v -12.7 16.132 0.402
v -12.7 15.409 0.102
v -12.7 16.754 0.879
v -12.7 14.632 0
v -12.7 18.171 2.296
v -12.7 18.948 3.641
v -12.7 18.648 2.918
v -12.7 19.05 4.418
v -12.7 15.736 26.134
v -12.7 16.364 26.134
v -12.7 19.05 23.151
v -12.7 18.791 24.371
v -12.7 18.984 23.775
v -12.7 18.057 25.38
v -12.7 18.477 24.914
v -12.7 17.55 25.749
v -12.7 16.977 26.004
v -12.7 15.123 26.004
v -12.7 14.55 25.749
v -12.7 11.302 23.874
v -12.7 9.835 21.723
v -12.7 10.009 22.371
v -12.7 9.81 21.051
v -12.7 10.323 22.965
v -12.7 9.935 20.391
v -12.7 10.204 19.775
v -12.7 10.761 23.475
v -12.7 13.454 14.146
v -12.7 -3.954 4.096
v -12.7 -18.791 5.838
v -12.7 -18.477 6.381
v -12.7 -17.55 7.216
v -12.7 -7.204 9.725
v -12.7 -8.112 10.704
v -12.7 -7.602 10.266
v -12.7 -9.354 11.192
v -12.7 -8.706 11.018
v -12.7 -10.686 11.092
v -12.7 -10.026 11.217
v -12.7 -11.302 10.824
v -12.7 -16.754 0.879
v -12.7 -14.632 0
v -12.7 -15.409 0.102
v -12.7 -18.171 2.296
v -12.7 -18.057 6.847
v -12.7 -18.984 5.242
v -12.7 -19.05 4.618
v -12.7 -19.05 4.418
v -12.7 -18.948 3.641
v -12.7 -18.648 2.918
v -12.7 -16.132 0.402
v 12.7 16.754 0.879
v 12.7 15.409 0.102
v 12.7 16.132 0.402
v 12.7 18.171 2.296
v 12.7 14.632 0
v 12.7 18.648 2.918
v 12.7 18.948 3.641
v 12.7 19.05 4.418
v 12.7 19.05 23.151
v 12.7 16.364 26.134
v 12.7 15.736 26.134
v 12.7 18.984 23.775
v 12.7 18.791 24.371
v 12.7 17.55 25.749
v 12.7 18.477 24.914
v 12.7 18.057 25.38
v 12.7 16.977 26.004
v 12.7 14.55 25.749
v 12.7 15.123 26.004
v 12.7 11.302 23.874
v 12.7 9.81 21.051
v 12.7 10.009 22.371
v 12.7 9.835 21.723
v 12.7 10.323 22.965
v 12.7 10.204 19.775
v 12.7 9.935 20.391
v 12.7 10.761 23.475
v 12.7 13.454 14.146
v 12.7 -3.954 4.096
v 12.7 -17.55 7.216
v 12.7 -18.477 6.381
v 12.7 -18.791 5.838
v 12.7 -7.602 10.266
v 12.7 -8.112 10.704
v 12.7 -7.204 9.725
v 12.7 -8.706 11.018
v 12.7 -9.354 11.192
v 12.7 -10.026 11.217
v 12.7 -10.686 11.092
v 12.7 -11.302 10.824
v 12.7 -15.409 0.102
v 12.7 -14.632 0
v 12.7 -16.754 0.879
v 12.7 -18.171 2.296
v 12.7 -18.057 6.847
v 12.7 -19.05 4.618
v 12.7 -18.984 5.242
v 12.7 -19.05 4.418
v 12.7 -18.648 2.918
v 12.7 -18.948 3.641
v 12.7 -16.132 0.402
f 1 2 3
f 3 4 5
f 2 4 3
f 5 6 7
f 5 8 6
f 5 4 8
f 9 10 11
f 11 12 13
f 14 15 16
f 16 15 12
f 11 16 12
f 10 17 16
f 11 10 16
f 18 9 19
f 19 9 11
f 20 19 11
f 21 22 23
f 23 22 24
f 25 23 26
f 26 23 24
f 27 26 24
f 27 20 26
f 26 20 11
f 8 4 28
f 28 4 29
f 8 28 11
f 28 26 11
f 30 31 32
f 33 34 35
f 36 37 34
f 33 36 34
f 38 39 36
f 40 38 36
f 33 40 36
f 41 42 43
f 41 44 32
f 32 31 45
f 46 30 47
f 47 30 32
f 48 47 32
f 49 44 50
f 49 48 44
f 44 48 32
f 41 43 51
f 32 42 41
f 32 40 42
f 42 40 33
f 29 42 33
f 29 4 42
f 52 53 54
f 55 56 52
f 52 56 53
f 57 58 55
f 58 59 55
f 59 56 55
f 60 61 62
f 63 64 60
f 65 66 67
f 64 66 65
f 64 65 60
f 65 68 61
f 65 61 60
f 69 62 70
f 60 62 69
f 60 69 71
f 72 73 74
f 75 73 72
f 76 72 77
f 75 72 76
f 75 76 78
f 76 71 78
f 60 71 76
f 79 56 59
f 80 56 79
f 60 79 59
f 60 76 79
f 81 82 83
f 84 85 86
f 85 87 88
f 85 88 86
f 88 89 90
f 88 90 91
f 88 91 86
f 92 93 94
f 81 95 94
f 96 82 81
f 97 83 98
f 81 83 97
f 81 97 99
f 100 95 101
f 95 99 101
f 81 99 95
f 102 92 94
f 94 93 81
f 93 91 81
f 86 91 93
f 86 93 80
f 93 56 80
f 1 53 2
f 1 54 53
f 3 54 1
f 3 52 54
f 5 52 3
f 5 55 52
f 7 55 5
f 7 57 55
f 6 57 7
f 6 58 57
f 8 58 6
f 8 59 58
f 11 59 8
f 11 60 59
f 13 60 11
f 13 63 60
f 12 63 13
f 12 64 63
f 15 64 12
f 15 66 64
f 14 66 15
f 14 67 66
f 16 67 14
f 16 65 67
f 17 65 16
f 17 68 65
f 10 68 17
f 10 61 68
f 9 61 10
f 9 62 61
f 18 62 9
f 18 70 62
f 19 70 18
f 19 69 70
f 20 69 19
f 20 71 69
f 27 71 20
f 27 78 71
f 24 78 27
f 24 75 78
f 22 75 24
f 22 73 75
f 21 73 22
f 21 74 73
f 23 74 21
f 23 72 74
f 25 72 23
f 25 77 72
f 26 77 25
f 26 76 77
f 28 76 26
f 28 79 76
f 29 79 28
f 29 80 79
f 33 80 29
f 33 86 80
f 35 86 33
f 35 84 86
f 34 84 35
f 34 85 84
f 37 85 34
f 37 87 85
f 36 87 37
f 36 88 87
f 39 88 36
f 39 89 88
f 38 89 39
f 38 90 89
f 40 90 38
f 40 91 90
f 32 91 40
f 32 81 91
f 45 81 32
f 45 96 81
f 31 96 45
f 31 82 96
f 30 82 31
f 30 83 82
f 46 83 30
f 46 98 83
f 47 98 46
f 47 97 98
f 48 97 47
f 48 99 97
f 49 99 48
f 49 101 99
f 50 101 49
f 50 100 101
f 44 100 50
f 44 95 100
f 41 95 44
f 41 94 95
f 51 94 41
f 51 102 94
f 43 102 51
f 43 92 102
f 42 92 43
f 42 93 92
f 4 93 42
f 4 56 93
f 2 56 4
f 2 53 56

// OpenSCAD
// file: ../lib/TOGUnitTable-v1.scad
// TOGUnitTable-v1.1.0 - Library for handling 'complex amounts' in the form of [multiplier, unit name], e.g. [1.5, "inch"]
//
// 2023-07-01: the following 'annotation' is something I just made up,
// but is intended as a way for future packaging tools to know that it's 'safe'
// (because everything has been somewhat namespaced) to turn a `use <x>`
// into an `include <x>`, making it inlinable:
// safe-to-include: true
// 
// Versions:
// v1.0.0:
// - Created it.
// v1.1.0:
// - Add optional 'dbgctxstr' parameter to unit decoding functions, for better error messages
// 
// Naming convention:
// Doing 'OO without classes', here.
// Fully qualified name = class or package name + "__" + member name
// Class or package name may itself be namespaced, and class names may double as package names.
// Here, tog_unittable names both a class and a package.

// Demo unit table uses 'micrometer' as the base unit
// in order to keep multipliers as integers as much as possible.
tog_unittable__demo_unit_table = [
	["um",    [    1   ,   "um"], "micrometer" ],
	["mm",    [ 1000   ,   "um"], "millimeter" ],
	["inch",  [25400   ,   "um"], "inch"       ],
	["u",     [    1/16, "inch"], "model unit" ], // As used by TGx9 et al
	["atom",  [    8   ,    "u"], "model atom" ],
	["chunk", [    3   , "atom"], "model chunk"],
];

use <./DbgCtxStrLib1.scad>

function tog_unittable__list__filter(list, predicate) = [
	for( item=list ) if( predicate(item) ) item
];
function tog_unittable__list__first(list, on_error) =
	len(list) > 0 ? list[0] : on_error();

function tog_unittable__unit_value_ca(unit_table, unit_name, dbgctxstr=undef) =
	tog_unittable__list__first(
		tog_unittable__list__filter(unit_table, function (entry) entry[0] == unit_name),
		function () assert(false,
			str("Did not find entry for unit '", unit_name, "' in unit table", dbgctxstr_errmsg_suffix(dbgctxstr))
		)
	)[1];

function tog_unittable__ca__is_valid( ca ) =
	is_list(ca) && len(ca) == 2;

// Break down 'amount' until it is in a base unit (one which is defined in terms of itself)
function tog_unittable__simplify_ca(unit_table, amount, dbgctxstr=undef) =
	assert( tog_unittable__ca__is_valid(amount), str(amount, " is not a valid Complex Amount (should be [numeric_value, \"unit_name\"])", dbgctxstr=dbgctxstr) )
	let( unit_value_ca = tog_unittable__unit_value_ca(unit_table, amount[1], dbgctxstr=dbgctxstr) )
	unit_value_ca[1] == amount[1] ? amount :
		tog_unittable__simplify_ca(unit_table, [amount[0] * unit_value_ca[0], unit_value_ca[1]]);

function tog_unittable__divide_ca(unit_table, numerator, denominator, dbgctxstr=undef) =
	let(
		numerator_base_ca   = tog_unittable__simplify_ca(unit_table, numerator, dbgctxstr=dbgctxstr),
		denominator_base_ca = tog_unittable__simplify_ca(unit_table, denominator, dbgctxstr=dbgctxstr)
	)
	assert(numerator_base_ca[1] == denominator_base_ca[1], str("Different base units found for ", numerator[1], " and ", denominator[1]))
	numerator_base_ca[0] / denominator_base_ca[0];	

assert(tog_unittable__divide_ca(tog_unittable__demo_unit_table, [1,   "mm"], [  1, "mm"]) ==     1   );
assert(tog_unittable__divide_ca(tog_unittable__demo_unit_table, [1,   "mm"], [  1, "um"]) ==  1000   );
assert(tog_unittable__divide_ca(tog_unittable__demo_unit_table, [1, "inch"], [  1, "um"]) == 25400   );
assert(tog_unittable__divide_ca(tog_unittable__demo_unit_table, [1, "inch"], [  1, "mm"]) ==    25.4 );
assert(tog_unittable__divide_ca(tog_unittable__demo_unit_table, [1, "inch"], [254, "um"]) ==   100   );
assert(tog_unittable__divide_ca(tog_unittable__demo_unit_table, [1,    "u"], [  1, "um"]) ==  1587.5 );
// file: ../lib/TOGStringLib1.scad
// TOGStringLib1.7
// 
// Functions for parsing quantities
// and other misc. string handling.
// 
// v1.5
// - togstr1_parse_quantity will treat unit-only strings as meaning 1/1 of that unit.
//   e.g. togstr1_parse_quantity("foot") = [[[1,1], "foot", 4]]
// v1.6:
// - togstr1_parse_quantity allows unit name to be omitted when quantity is zero and $togunits1_default_unit is defined
// v1.7:
// - Add optional 'dbgctxstr' parameter to unit decoding functions, for better error messages
// 
// Globals: $togunits1_default_unit - affects what 'unit' is returned
// when interpreting numbers or strings that lack the unit.


function togstr1__todo(message) = assert(false, str("TODO: ", message));

module togstr1__assert_eq(a, b) {
	if( a != b ) {
		assert( a == b, str(a, " != ", b) );
	}
}



function togstr1_slice(source, i0, i1) =
	i0 == i1 ? "" :
	str(source[i0], togstr1_slice(source, i0+1, i1));

function togstr1_tokenize(source, sep, maxcount=9999, i=0, tokenstart=0) =
	len(source) == i ? (
		(tokenstart < i) ? [togstr1_slice(source, tokenstart, i)] : []
	) :
	source[i] == sep ? (
		(tokenstart < i) ? concat([togstr1_slice(source, tokenstart, i)], togstr1_tokenize(source, sep, maxcount-1, i+1, i+1)) :
		togstr1_tokenize(source, sep, maxcount, i+1, i+1)
	) :
	maxcount <= 1 ? [togstr1_slice(source, tokenstart, len(source))] :
	togstr1_tokenize(source, sep, maxcount, i+1, tokenstart);

togstr1__assert_eq( ["foo","bar","baz"], togstr1_tokenize("foo-bar-baz", "-") );
// Duplicate delimiters are ignored
togstr1__assert_eq( ["foo","bar","baz"], togstr1_tokenize("foo--bar--baz", "-") );
// Trailing delimiters are ignored
togstr1__assert_eq( ["foo","bar","baz"], togstr1_tokenize("foo--bar--baz--", "-") );
// Leading delimiters are ignored
togstr1__assert_eq( ["foo","bar","baz"], togstr1_tokenize("--foo--bar--baz", "-") );
// Can limit number of tokens returned
togstr1__assert_eq( ["foo","bar-baz"], togstr1_tokenize("foo-bar-baz", "-", 2) );
togstr1__assert_eq( ["foo","bar-baz"], togstr1_tokenize("--foo--bar-baz", "-", 2) );
togstr1__assert_eq( ["foo","bar--baz"], togstr1_tokenize("--foo--bar--baz", "-", 2) );
togstr1__assert_eq( ["foo"], togstr1_tokenize("--foo--", "-", 2) );




/** \d+ -> [num, end_index] */
function togstr1_parse_decimal_nat(str, index=0, current=0, dbgctxstr=undef) =
	len(str) == index ? [current, index] :
	let( dig = ord(str[index]) - ord("0") )
	(dig >= 0 && dig <= 9) ? togstr1_parse_decimal_nat(str, index+1, current*10 + dig, dbgctxstr=dbgctxstr) :
	[current, index];

togstr1__assert_eq( [123,3], togstr1_parse_decimal_nat("123") );
togstr1__assert_eq( [123,3], togstr1_parse_decimal_nat("123.45") );

/** [+-]*\d+ ->  [[num, den], end_index] */
function togstr1_parse_decimal_number(str, index=0, dbgctxstr=undef) =
	str[index] == "+" ? togstr1_parse_decimal_number(str, index+1) :
	str[index] == "-" ? let(r=togstr1_parse_decimal_number(str, index+1)) [[-r[0][0], r[0][1]], r[1]] :
	let(r = togstr1_parse_decimal_nat(str, index, dbgctxstr=dbgctxstr))
	str[r[1]] != "." ? [[r[0], 1], r[1]] :
	let(fracr = togstr1_parse_decimal_nat(str, r[1]+1))
	let(mult = pow(10, fracr[1]-(r[1]+1)))
	[[r[0]*mult + fracr[0], mult], fracr[1]];

togstr1__assert_eq( [[   36,   1], 2], togstr1_parse_decimal_number( "36"   ) );
togstr1__assert_eq( [[ 3524, 100], 5], togstr1_parse_decimal_number( "35.24") );
togstr1__assert_eq( [[-3524, 100], 6], togstr1_parse_decimal_number("-35.24") );
togstr1__assert_eq( [[    0,   1], 0], togstr1_parse_decimal_number( "NotANumber") );

function togstr1__gcd(a, b) = b == 0 ? abs(a) : togstr1__gcd(b, a % b);

togstr1__assert_eq(10, togstr1__gcd(10, 20));
togstr1__assert_eq( 5, togstr1__gcd(10, 15));
togstr1__assert_eq( 2, togstr1__gcd(10, 14));


function togstr1__normalize_rat(rat) =
	let(gcd = togstr1__gcd(rat[0], rat[1]))
	// TODO: find LCD, divide top and bottom by it
	rat[0] < 0 && rat[1] < 0 ? [-rat[0]/gcd, -rat[1]/gcd] :
	[rat[0]/gcd, rat[1]/gcd];

/** <decnum>[/<decnum>] -> [[num, den], end_index] */
function togstr1__multiply_rat(a, b) =
	togstr1__normalize_rat(
		a[1] == b[1] ? [a[0]*b[0]/a[1], a[1]] : // TODO: LCD instead of special case
		[a[0]*b[0], a[1]*b[1]]
	);
function togstr1__divide_rat(a, b) = togstr1__normalize_rat([a[0]*b[1], a[1]*b[0]]);


function togstr1__add_rat(a, b) =
	togstr1__normalize_rat([a[0]*b[1] + b[0]*a[1], a[1]*b[1]]);
	
togstr1__assert_eq([1, 2], togstr1__add_rat([1, 3], [1, 6]));


/** Return [[num, den], end_index] */
function togstr1_parse_rational_number(str, index=0, dbgctxstr=undef) =
	let( numr = togstr1_parse_decimal_number(str, index, dbgctxstr=dbgctxstr) )
	str[numr[1]] == "+" ?
		let(numrb = togstr1_parse_rational_number(str, numr[1]+1, dbgctxstr=dbgctxstr))
		[togstr1__add_rat(numr[0], numrb[0]), numrb[1]]	:
	str[numr[1]] == "/" ?
		let( denr = togstr1_parse_decimal_number(str, numr[1]+1, dbgctxstr=dbgctxstr) )
		[togstr1__divide_rat(numr[0], denr[0]), denr[1]] :
	numr;

togstr1__assert_eq( [[   123,  1],3], togstr1_parse_rational_number( "123") );
togstr1__assert_eq( [[   123,  1],4], togstr1_parse_rational_number("+123") );
togstr1__assert_eq( [[-  123,  1],4], togstr1_parse_rational_number("-123") );
togstr1__assert_eq( [[   123,  1],6], togstr1_parse_rational_number("-+-123") );
togstr1__assert_eq( [[ 12345,100],6], togstr1_parse_rational_number("123.45") );
togstr1__assert_eq( [[  2469, 40],8], togstr1_parse_rational_number("123.45/2") );
togstr1__assert_eq( [[-  823,160],10], togstr1_parse_rational_number("-123.45/24") );
togstr1__assert_eq( [[     4,  3],5], togstr1_parse_rational_number( "1+1/3") );
togstr1__assert_eq( [[     0,  1],0], togstr1_parse_rational_number( "NotANumber!!") );


/** Return [[[num, den], unit], end_index] */
function togstr1_parse_quantity(str, dbgctxstr=undef) =
	let( numr = togstr1_parse_rational_number(str, dbgctxstr=dbgctxstr) )
	// For now, just let the unit be the rest of the string;
	// can revisit to stop at delimiters if needed in the future.
	numr[1] > 0 && numr[1] == len(str) && numr[0][0] == 0 && !is_undef($togunits1_default_unit) ? [[[0,1], $togunits1_default_unit], numr[1]] :
	assert( numr[1] < len(str), str("Quantity string missing unit: '", str, "'; note that '0' is acceptable if $togunits1_default_unit is defined"))
	let( unit = togstr1_slice(str, numr[1], len(str)) )
	let( quant = numr[1] > 0 ? numr[0] : [1,1] ) // No number = 1 (possibly this should be an error instead)
	[[quant, unit], len(str)];

togstr1__assert_eq( [[[  3,  1], "acre"],  5], togstr1_parse_quantity("3acre") );
togstr1__assert_eq( [[[  3,  5], "acre"],  7], togstr1_parse_quantity("3/5acre") );
togstr1__assert_eq( [[[301,500], "acre"], 10], togstr1_parse_quantity("3.01/5acre") );
togstr1__assert_eq( [[[  1,  1], "acre"],  4], togstr1_parse_quantity("acre") ); // Should either treat as one or throw an error!
togstr1__assert_eq( [[[  0,  1],"hectare"],1], togstr1_parse_quantity("0", $togunits1_default_unit="hectare") ); // Zero is fine if $togunits1_default_unit is defined
// file: ../lib/TOGridLib3.scad
// TOGridPileLib-v3.4
// 
// HOKAY WHAT ARE THE COMMON
// things that I want the library to do?
// 
// - [X] Be `include`-able, to make inlining easy
// - [X] Allow unit table to be overridden easily, but default by default
// - [ ] Support common configurations by name (e.g. "V9", or some "WSTYPE-...")
//   without having to pass 50 different parameters in
// - [ ] Support subtractions for those common configurations also,
//   such that you don't need to remember to 'do less rounding', etc.
// - [ ] Make a simple foot-only block that I can subtract stuff from
//   params: foot style
// - [ ] Make a block with a lip
// - [ ] Make a block foot, and I'll intersect it with some other things
// - [X] Translate a block_size_ca to mm
// 
// Changes:
// v3.1:
// - s/togridpile3_decode_size/togridpile3_decode_vector/
// v3.2:
// - togridpile3_decode(num) = num
// v3.3:
// - Change prefix from `togridpile3` to `togridlib3`
// v3.4:
// - Add optional 'dbgctxstr' parameter to unit decoding functions, for better error messages

use <../lib/TOGUnitTable-v1.scad>

function togridlib3_map(arr, fn) = [ for(item=arr) fn(item) ];

togridlib3_default_unit_table = [
	["um",    [    1,               "um"]],
	["mm",    [ 1000,               "um"]],
	["inch",  [25400,               "um"]],
	["u",     [    1.5875,          "mm"]],
	["atom",  [    8,                "u"]],
	["chunk", [    3,             "atom"]],
	["tgp-standard-bevel"   , [2,    "u"]], // Usuually 1/8"
	["m-outer-corner-radius", [4,    "u"]],
	["f-outer-corner-radius", [3,    "u"]],
];

function togridlib3_get_default_unit_table() = togridlib3_default_unit_table;
function togridlib3_get_unit_table() = is_undef($togridlib3_unit_table) ? togridlib3_default_unit_table : $togridlib3_unit_table;

function togridlib3_decode(dim, unit=[1, "mm"], unit_table=togridlib3_get_unit_table(), dbgctxstr=undef) =
	is_num(dim) ? dim : tog_unittable__divide_ca(unit_table, dim, unit, dbgctxstr=dbgctxstr);
function togridlib3_decode_vector(size, unit=[1, "mm"], unit_table=togridlib3_get_unit_table(), dbgctxstr=undef) =
	togridlib3_map(size, function(dim) is_num(dim) ? dim : tog_unittable__divide_ca(unit_table, dim, unit, dbgctxstr=dbgctxstr));

module togridlib3_cube(size, offset=0) {
	cube(togridlib3_decode_vector(size), center=true);
}
// file: ../lib/DbgCtxStrLib1.scad
// DbgCtxStrLib1.0
// 
// Library for dealing with 'debug context strings' (usually 'dbgctxstr').

function dbgctxstr_errmsg_suffix(dbgctxstr) =
	is_undef(dbgctxstr) || dbgctxstr == "" ? "" :
	str(" (", dbgctxstr, ")");
// file: ../lib/TOGComplexLib1.scad
function tcplx1_multiply(a, b) =
	[a[0]*b[0] - a[1]*b[1], a[0]*b[1] + a[1]*b[0]];
function tcplx1_divide(a, b) =
	let(bot = (b[0]*b[0] + b[1]*b[1]))
	[
		(a[0]*b[0] + a[1]*b[1])/bot,
		(a[1]*b[0] - a[0]*b[1])/bot
	];

assert([-11,23] == tcplx1_multiply([3,2], [1,7]));

assert([-1,3] == tcplx1_multiply([3,1], [0,1]));
assert([-1,3] == tcplx1_multiply([0,1], [3,1]));

echo(tcplx1_divide([-1,3], [3,1]));
assert([0,1] == tcplx1_divide([-1,3], [3,1]));

function tcplx1_normalize(vec) =
	let(veclen = sqrt(vec[0]*vec[0]+vec[1]*vec[1]))
	[vec[0] / veclen, vec[1] / veclen];

function tcplx1_relative_turnvec_vv(v0, v1) =
	tcplx1_divide(tcplx1_normalize(v1), tcplx1_normalize(v0));

function tcplx1_relative_turnvec_abc(p0, p1, p2) = tcplx1_relative_turnvec_vv(p1-p0, p2-p1);

// A 90-degree turn
assert([0,1] == tcplx1_relative_turnvec_abc([0,0], [1,0], [1,1]));
assert([0,1] == tcplx1_relative_turnvec_abc([0,0], [0,1], [-1,1]));

// A 45-degree turn
assert(tcplx1_normalize([1,1]) == tcplx1_relative_turnvec_abc([0,0], [1,0], [ 2,1]));
assert(tcplx1_normalize([1,1]) == tcplx1_relative_turnvec_abc([0,0], [0,1], [-1,2]));


function tcplx1_relative_angle_abc(p0, p1, p2) =
	let(turnvec = tcplx1_relative_turnvec_abc(p0, p1, p2))
	atan2(turnvec[1], turnvec[0]);

assert(-135 == tcplx1_relative_angle_abc([0,0], [1,0], [0,-1]));
assert( -90 == tcplx1_relative_angle_abc([0,0], [1,0], [1,-1]));
assert(   0 == tcplx1_relative_angle_abc([0,0], [1,0], [2, 0]));
assert(  90 == tcplx1_relative_angle_abc([0,0], [1,0], [1, 1]));
assert( 135 == tcplx1_relative_angle_abc([0,0], [1,0], [0, 1]));

assert(  90 == tcplx1_relative_angle_abc([1,1], [3,3], [1, 5]));
// file: ../lib/TOGArrayLib1.scad
// TOGArrayLib1.5
// 
// Functions for working with arrays.
// 
// v1.1:
// - tal1_reduce assert(is_list(items)) to prevent infinite recursion
//   when given undefined or other non-list values
// v1.1.1:
// - Fix tal1_uniq_remap_v2 to return "list-remap-result" as the
//   first element of the returned list
// v1.2:
// - Add tal1_replace_at function
// v1.3:
// - tal1_is_vec_of, tal1_is_vec_of_num
// v1.4:
// - tal1_assert_for_each, for when you want to assert something
//   about each of a list of items and get nice failure messages
// v1.5:
// - Add tal1_duplicate_reversed function, which may be
//   handy when generating symmetrical polygons and stuff.

/**
 * Make a list with the contents of list `a`,
 * but starting at offset `off`, replaced by the contents of list `b`.
 * len(result) = max(len(a), off+len(b))
 */
function tal1_replace_at(a, off, b, default_value=undef, default_value_function=undef) =
	assert(is_list(a))
	assert(is_list(b))
	let( _dvf = !is_undef(default_value_function) ? default_value_function : function(i) default_value )
[
	for( i=[0:1:min(off,len(a))-1] ) a[i],
	for( i=[len(a):1:off-1] ) _dvf(i),
	for( i=[off:1:off+len(b)-1] ) b[i-off],
	for( i=[off+len(b):1:len(a)-1] ) a[i],
];

// Simplest case
assert([] == tal1_replace_at([], 0, []));
// Second simplest cases
assert(["foo"] == tal1_replace_at(["foo"], 0, []));
assert(["foo"] == tal1_replace_at([], 0, ["foo"]));
// Replace one item
assert(["foo","quux","baz"] == tal1_replace_at(["foo","bar","baz"], 1, ["quux"]));
// Replace and extend
assert(["foo","quux","tuna","tina"] == tal1_replace_at(["foo","bar","baz"], 1, ["quux", "tuna", "tina"]));
// Add beyond end of `a`
assert(["foo","zzz","quux"] == tal1_replace_at(["foo"], 2, ["quux"], default_value="zzz"));
// Adding 'nothing' should still fill to that point with defaults
assert(["foo","zzz","zzz"] == tal1_replace_at(["foo"], 3, [], default_value="zzz"));


function tal1_reduce(start, items, func, offset=0) =
	assert(is_list(items))
	len(items) == offset ? start :
	tal1_reduce(func(start, items[offset]), items, func, offset+1);

function tal1_consecutive_duplicate_count(items) = tal1_reduce(
	[0, undef],
	items,
	function(z,item) [z[0] + (item == z[1] ? 1 : 0), item]
)[0];

assert(0 == tal1_consecutive_duplicate_count([]));
assert(0 == tal1_consecutive_duplicate_count([50]));
assert(1 == tal1_consecutive_duplicate_count([50,50]));
assert(0 == tal1_consecutive_duplicate_count([50,51,52,53]));
assert(1 == tal1_consecutive_duplicate_count([50,51,52,52]));
assert(3 == tal1_consecutive_duplicate_count([50,50,50,50]));

// Set test_size to arbirarily large values
// to ensure that OpenSCAD can handle heavy recursion
let(test_size=1000) assert(test_size/2 == tal1_consecutive_duplicate_count([for(i=[0:1:test_size-1]) floor(i/2)]));



function tal1_uniq_(items, off0, off1) =
	let(chunklen = off1-off0)
	chunklen == 0 ? [] :
	chunklen == 1 ? [items[off0]] :
	let(half=floor(chunklen/2))
	let(left  = tal1_uniq_(items, off0     , off0+half))
	let(right = tal1_uniq_(items, off0+half, off1     ))
	assert(len(left) > 0)
	assert(len(right) > 0)
	left[len(left)-1] == right[0] ? [each left, for(i=[1:1:len(right)-1]) right[i]] :
	[each left, each right];

/** Given a list of items, returns a new list with identical consecutive items merged */
function tal1_uniq(items) = tal1_uniq_(items, 0, len(items));

assert([] == tal1_uniq([]));
assert([123] == tal1_uniq([123]));
assert([55,0,1,2,3] == tal1_uniq([55,0,1,2,3]));
assert([55,0,1,2] == tal1_uniq([55,0,1,1,2]));
assert([55,0,1] == tal1_uniq([55,55,0,0,0,0,0,0,1,1,1,1]));
assert([55,0] == tal1_uniq([55,0,0,0,0,0,0,0]));



/**
 * Returns [new items, old index -> new index mapping].
 * No-op version.
 */
function tal1_uniq_remap_v1(items) =
	["list-remap-result", items, [for (vi=[0:1:len(items)-1]) vi]];

// [a, a, b, b, c, c]
//
// [a,    ...], []  -> [a],[0]
// [a, a, ...], [0] -> [a],[0,0]

assert([1,2,3] == [1,2,3]);

/**
 * Recursive version that will combine adjacent identical vertexes,
 * but will use the original items.
 */
function tal1_uniq_remap_v2(items, map=[]) =
	let(index = len(map))
	len(items) == index ? ["list-remap-result", items, map] :
	index == 0 ? tal1_uniq_remap_v2(items, [0]) :
	items[index] == items[map[index-1]] ? tal1_uniq_remap_v2(items, [for(vi=map) vi, map[index-1]]) :
	tal1_uniq_remap_v2(items, [for(vi=map) vi, index]);

assert(tal1_uniq_remap_v2([1,1,2,2,3,4]) == ["list-remap-result", [1,1,2,2,3,4], [0,0,2,2,4,5]]);


/**
 * Returns true if `vec` is a list of at least min_len items
 * and component_check(each item, even those beyond min_len) is true.
 */
function tal1_is_vec_of(vec, min_len=0, component_check=function(x) true) =
	assert(is_num(min_len) && min_len >= 0)
	assert(is_function(component_check))
	is_list(vec) && len(vec) >= min_len &&
	tal1_reduce(true, vec, function(prev,item) prev && component_check(item));

function tal1_is_vec_of_num(vec, min_len=0) = tal1_is_vec_of(vec, min_len, function(i) is_num(i));

assert( true == tal1_is_vec_of_num([1,2,3]));
assert( true == tal1_is_vec_of_num([]));
assert( true == tal1_is_vec_of_num([1,2,3], 3));
assert(false == tal1_is_vec_of_num([1,2], 3));
assert(false == tal1_is_vec_of_num([1,2,"spoon"], 3));
// Requirements are ambiguous when
// first min_len items are numbers, but there are non-numeric items afterwards,
// so let's error on the side of saying 'no, it's not a list of numbers';
// i.e. the item check and the min_len are independent.
assert(false == tal1_is_vec_of_num([1,2,3,"artichoke"], 3));


/**
 * Asserts that item_checker(each item in list, index of item)[0] is true.
 * Second element of item_checker return value is assertion message.
 * Returns the original list, in case that's useful to you.
 */
function tal1_assert_for_each(list, item_checker) =
	let( _ignored = [ for(i=[0:1:len(list)-1])
		let(q=item_checker(list[i],i))
		let(passed=is_bool(q) ? q : is_list(q) ? q[0] : assert(false, str(
			"tal1_assert_for_each: item_checker should return Bool|[Bool,String], but returned ",
			q, " for item at index ", i)))
		let(message=is_list(q) ? q[1] : undef)
		assert(passed, message)
		q
	])
	list;

// Callback can return a boolean...
assert([1,2,3] == tal1_assert_for_each([1,2,3], function(v,i) is_num(v)));
// ...or a [boolean, string]
assert([1,2,3] == tal1_assert_for_each([1,2,3], function(v,i) [is_num(v), "element be a num"]));

// [a, b, c] -> [a, b, c, rxf(c), rxf(b), rxf(a)]
function tal1_duplicate_reversed(list, rxf=function(item) item) =
	[
		each list,
		for( i=[len(list)-1 : -1 : 0] ) rxf(list[i]),
	];
// file: ../lib/TOGUnits1.scad
// TOGUnits1.7
// 
// For simlifying quantity parsing and unit conversion
// 
// v1.1:
// - Add `togunits1_decode` function
// v1.2:
// - Add togunits1_decode_vec
// v1.3:
// - Add togunits1_vec_to_cas
// v1.4:
// - Add togunits1_vec_to_mms
// v1.5:
// - Remove unused `unit` parameter from `togunits1_vec_to_cas`
// v1.6:
// - togunits1_decode accepts `xf` parameter, same as togunits1_decode_vec
// v1.7:
// - Add optional 'dbgctxstr' parameter to unit decoding functions, for better error messages
// 
// Reserved but not-yet-actually-used globals:
// - $togunits1_default_unit - default unit when interpreting "0"
//   - See TOGStringLib1
// - $togunits1_default_implied_unit - when interpreting quantities without unit, assume they have this one
//   - This might be a bad idea, so never implemented!

use <./DbgCtxStrLib1.scad>
use <./TOGridLib3.scad>
use <./TOGStringLib1.scad>

function togunits1__is_ca(what) =
	is_list(what) && len(what) == 2 && is_num(what[0]) && is_string(what[1]);

function togunits1__parse_to_ca(what, dbgctxstr=undef) =
	assert( is_string(what) )
	let( parseresult = togstr1_parse_quantity(what, dbgctxstr) )
	assert( parseresult[1] > 0, str("Failed to parse quantity from  ", what, dbgctxstr=dbgctxstr) )
	let( parsed = parseresult[0] )
	let( rat = parsed[0] )
	let( unit = parsed[1] )
	[rat[0]/rat[1], unit];

function togunits1_to_ca(what, dbgctxstr=undef) =
	is_string(what) ? togunits1__parse_to_ca(what, dbgctxstr=dbgctxstr) :
	togunits1__is_ca(what) ? what :
	is_num(what) ? [what, "mm"] :
	assert(false, str("Unrecognized quantity representation: ", what));

function togunits1_vec_to_cas(whats) =
	[for(w=whats) togunits1_to_ca(w)];

function togunits1__get_transform(name) =
	is_function(name) ? name :
	is_undef(name) ? function(n) n :
	name == "round" ? function(n) round(n) :
	name == "ceil" ? function(n) ceil(n) :
	assert(false, str("Unrecognized transform: '", name, "'"));

function togunits1_decode(what, unit=[1,"mm"], xf=undef, dbgctxstr=undef) =
	let( ca = togunits1_to_ca(what, dbgctxstr=dbgctxstr) )
	let( xf1 = togunits1__get_transform(xf) )
	xf1(togridlib3_decode(ca, unit=togunits1_to_ca(unit), dbgctxstr=dbgctxstr));

function togunits1_decode_vec(whats, unit=[1,"mm"], xf=undef) =
	let( unit_ca = togunits1_to_ca(unit) )
	let( xf1 = togunits1__get_transform(xf) )
	[for(w=whats) xf1(togunits1_decode(w, unit_ca))];

function togunits1_to_mm(what, dbgctxstr=undef) = togunits1_decode(what, [1,"mm"], dbgctxstr=dbgctxstr);
function togunits1_vec_to_mms(what) = togunits1_decode_vec(what, [1,"mm"]);
// file: ../lib/TOGMod1Constructors.scad
// TOGMod1Constructors-v1.11
// 
// Functions to construct objects understood by TOGMod1
// 
// v1.1:
// - Add togmod1_make_rounded_rect
// v1.2:
// - togmod1_make_rounded_rect can make ovals
// v1.3:
// - togmod1_circle_points, to just get the points of a circle
// - if pos parameter to circle function has a third element,
//   returned vertexes will include it as the z component;
// v1.3.1
// - Some assertions
// v1.4:
// - Refactor togmod1_rounded_rect_points and togmod1_circle_points
//   to use togmod1__make_nd_vector_adder for adapting to whatever
//   `pos` parameter is.
// v1.5:
// - togmod_rounded_rect_points will not simplify completely rounded sides
//   (where length of side is exactly twice the rounding radius)
//   unless simplify_rounded_sides=true
//   - This makes it more useful for polyhedron generation,
//     where radius varies, but number of points must remain constant.
// v1.6:
// - togmod1_make_rect makes a simple rectangle
// - togmod1_make_rounded_rect will defer to togmod1_make_rect when r=0
// v1.7:
// - togmod1_make_circle will return empty shape (["union"]) when d=0
// v1.8:
// - Add togmod1_text
// v1.9:
// - togmod1_circle_points uses 3 as minimum circle point count instead of 6
// v1.10:
// - Fix togmod1_linear_extrude_y so that range corresponds to Y start/end and
//   polygon X,Y correspond to X,Z.  Previously it was rotated wrongly,
//   which would have gone unnoticed for symmetrical shapes centered at 0,0.
// v1.11:
// - Remove an 'echo'

use <./TOGArrayLib1.scad>

function togmod1__make_nd_vector_adder(origin=[0,0]) =
	let(origin_is_zero = tal1_reduce(true, origin, function(prev,item) prev && item == 0))
	origin_is_zero ? (function(vec) len(vec) >= len(origin) ? vec : tal1_replace_at(origin, 0, vec)) :
	function(vec) [
		for(i=[0:1:max(len(origin),len(vec))-1]) (len(vec) > i ? vec[i] : 0) + (len(origin) > i ? origin[i] : 0),
	];

assert([1,2,3] == togmod1__make_nd_vector_adder()([1,2,3]));
assert([1,2,3] == togmod1__make_nd_vector_adder([0,0,3])([1,2]));


function togmod1_make_cuboid(size) =
	assert(is_list(size))
	assert(len(size) >= 3)
	assert(is_num(size[0]))
	assert(is_num(size[1]))
	assert(is_num(size[2]))
	["polyhedron-vf", [
		[-size[0]/2, -size[1]/2, -size[2]/2],
		[+size[0]/2, -size[1]/2, -size[2]/2],
		[-size[0]/2, +size[1]/2, -size[2]/2],
		[+size[0]/2, +size[1]/2, -size[2]/2],
		[-size[0]/2, -size[1]/2, +size[2]/2],
		[+size[0]/2, -size[1]/2, +size[2]/2],
		[-size[0]/2, +size[1]/2, +size[2]/2],
		[+size[0]/2, +size[1]/2, +size[2]/2]
	], [
		[0,1,3,2],[0,4,5,1],[4,6,7,5],[3,7,6,2],[1,5,7,3],[6,4,0,2]
	]];

function togmod1_make_polygon(verts) =
	["polygon-vp", verts, [[for( i=[0:1:len(verts)-1] ) i%len(verts)]]];

function togmod1_rounded_rect_points(size, r, pos=[0,0], simplify_rounded_sides=false) =
	assert(is_list(size))
	assert(len(size) >= 2)
	let(radii = is_list(r) ? r : is_num(r) ? [r,r] : assert(false, "rounded_rect r(adius) should be list<num> or num"))
	let(rx = radii[0])
	let(ry = radii[1])
	assert(is_num(rx))
	assert(is_num(ry))
	assert(size[0] >= 2*rx, str("size[0] must be >= 2*r[0]; size[0] = ",size[0],", 2*r[0] = ",2*rx))
	assert(size[1] >= 2*ry, str("size[1] must be >= 2*r[1]; size[1] = ",size[1],", 2*r[1] = ",2*ry))
	let(quarterfn=max($fn/4, 1))
	let(qfnx = simplify_rounded_sides && size[0] == 2*rx ? quarterfn-1 : quarterfn)
	let(qfny = simplify_rounded_sides && size[1] == 2*ry ? quarterfn-1 : quarterfn)
	let(finalizepos = togmod1__make_nd_vector_adder(pos))
[
	for(a=[0 : 1 : qfnx]) let(ang=      a*90/quarterfn) finalizepos([ size[0]/2-rx + rx*cos(ang),  size[1]/2-ry + ry*sin(ang)]),
	for(a=[0 : 1 : qfny]) let(ang= 90 + a*90/quarterfn) finalizepos([-size[0]/2+rx + rx*cos(ang),  size[1]/2-ry + ry*sin(ang)]),
	for(a=[0 : 1 : qfnx]) let(ang=180 + a*90/quarterfn) finalizepos([-size[0]/2+rx + rx*cos(ang), -size[1]/2+ry + ry*sin(ang)]),
	for(a=[0 : 1 : qfny]) let(ang=270 + a*90/quarterfn) finalizepos([ size[0]/2-rx + rx*cos(ang), -size[1]/2+ry + ry*sin(ang)]),
];

function togmod1_make_rect(size) =
	togmod1_make_polygon([
		[-size[0]/2, -size[1]/2],
		[+size[0]/2, -size[1]/2],
		[+size[0]/2, +size[1]/2],
		[-size[0]/2, +size[1]/2],
	]);

function togmod1_make_rounded_rect(size, r) =
	r == 0 ? togmod1_make_rect(size) :
	togmod1_make_polygon(togmod1_rounded_rect_points(size,r,simplify_rounded_sides=true));

/**
 * Returns points for an approximation of a circle where points are at distance r from pos.
 * Can be used to make other regular polygons, but the faces will be less than that
 * distance from pos (do some trig if you want face distance, e.g. for a hex nut).
 */
function togmod1_circle_points(r, pos=[0,0], d=undef) =
	assert( !is_undef(r) || !is_undef(d) )
	assert(!is_undef(pos[0]))
	assert(!is_undef(pos[1]))
	let(finalizepos = togmod1__make_nd_vector_adder(pos))
	let(r_ = !is_undef(r) ? r : d/2)
	let(fn = max($fn, 3))
	[for(i=[0 : 1 : fn-1]) finalizepos([r_*cos(i*360/fn), r_*sin(i*360/fn)])];

function togmod1_make_circle(r, pos=[0,0], d=undef) =
	r == 0 || d == 0 ? ["union"] :
	togmod1_make_polygon(togmod1_circle_points(r=r, pos=pos, d=d));

function togmod1_make_cylinder(d, zrange=[0,1], r=undef, pos=[0,0]) =
	assert( !is_undef(r) || !is_undef(d) )
	let( r_ = !is_undef(r) ? r : d/2 )
	// TODO: Make polyhedron directly
	["linear-extrude-zs", zrange, togmod1_make_circle(r=r_, pos=pos)];

function togmod1__is_range1d(range) = is_list(range) && len(range) == 2 && is_num(range[0]) && is_num(range[1]);

function togmod1_linear_extrude_z(range, shape) =
	assert(togmod1__is_range1d(range))
	["linear-extrude-zs", range, shape];
function togmod1_linear_extrude_x(range, shape) =
	assert(togmod1__is_range1d(range))
	["rotate", [90, 0, 90], togmod1_linear_extrude_z(range, shape)];
function togmod1_linear_extrude_y(range, shape) =
	assert(togmod1__is_range1d(range))
	["rotate", [90, 0,  0], togmod1_linear_extrude_z([-range[1], -range[0]], shape)];

function togmod1_text(text, size, font, halign, valign, spacing, direction, language, script) =
	["text-tsfhvsdls", text, size, font, halign, valign, spacing, direction, language, script];
// file: ../lib/TOGMod1.scad
// TOGMod1.9
// OpenSCAD library for representing shapes
// 
// See also: Functional OpenSCAD (https://github.com/thehans/FunctionalOpenSCAD)
// 
// v1.8:
// - Add `text-tsfhvsdls`
// v1.9
// - Add `offset-ds` (offset with _d_elta a _s_hape)

module togmod1_domodule(mod) {
	assert(is_list(mod));
	assert(len(mod) > 0);
	if( mod[0] == "polygon-vp" ) {
		// ["polygon-vp", vertexes, paths]
		polygon(points=mod[1], paths=mod[2]);
	} else if( mod[0] == "polyhedron-vf" ) {
		polyhedron(mod[1], faces=mod[2]);
	} else if( mod[0] == "scale" ) {
		assert(len(mod) == 3);
		scale(mod[1]) togmod1_domodule(mod[2]);
	} else if( mod[0] == "translate" ) {
		assert(len(mod) == 3);
		assert(is_list(mod[1]));
		for(c=mod[1]) assert(is_num(c), "translate component should be numeric");
		translate(mod[1]) togmod1_domodule(mod[2]);
	} else if( mod[0] == "rotate" ) {
		assert(len(mod) == 3);
		rotate(mod[1]) togmod1_domodule(mod[2]);
	} else if( mod[0] == "intersection" ) {
		intersection_for( i=[1:1:len(mod)-1] ) togmod1_domodule(mod[i]);
	} else if( mod[0] == "difference" ) {
		difference() {
			togmod1_domodule(mod[1]);
			for( i=[2:1:len(mod)-1] ) togmod1_domodule(mod[i]);
		}
	} else if( mod[0] == "union" ) {
		for( i=[1:1:len(mod)-1] ) togmod1_domodule(mod[i]);
	} else if( mod[0] == "hull" ) {
		hull() for( i=[1:1:len(mod)-1] ) togmod1_domodule(mod[i]);
	} else if( mod[0] == "offset-rs" ) {
		assert(len(mod) == 3);
		assert(is_num(mod[1]));
		assert(is_list(mod[2]));
		offset(mod[1]) togmod1_domodule(mod[2]);
	} else if( mod[0] == "linear-extrude-zs" ) {
		// ["linear-extrude-zs", [z0,z1], 2d_shape] // centered
		// ["linear-extrude-zs", height, 2d_shape]
		let( zrange = is_list(mod[1]) ? mod[1] : [-mod[1]/2, mod[1]/2] ) {
			translate([0,0,zrange[0]]) linear_extrude(zrange[1]-zrange[0]) togmod1_domodule(mod[2]);
		}
	} else if( mod[0] == "render" ) {
		render() togmod1_domodule(mod[1]);
	} else if( mod[0] == "minkowski" ) {
		minkowski() {
			togmod1_domodule(mod[1]);
			togmod1_domodule(mod[2]);
		}
	} else if( mod[0] == "x-debug" ) {
		# togmod1_domodule(mod[1]);
	} else if( mod[0] == "x-color" ) {
		color(mod[1]) togmod1_domodule(mod[2]);
	} else if( mod[0] == "text-tsfhvsdls" ) {
		text(text=mod[1], size=mod[2], font=mod[3], halign=mod[4], valign=mod[5], spacing=mod[6], direction=mod[7], language=mod[7], script=mod[8]);
	} else if( mod[0] == "offset-ds" ) {
		assert(is_num(mod[1]));
		assert(is_list(mod[2]));
		offset(delta=mod[1]) togmod1_domodule(mod[2]);
	} else {
		assert(false, str("Unrecognized shape: ", mod[0]));
	}
}
// main file
// RSAKeyHolder0.1

angle = 30;
groove_depth =  "9.5mm";
groove_width = "20.1mm";
$fn = 32;

module __rsakeyholder0__end_params() { }

use <../lib/TOGMod1.scad>
use <../lib/TOGMod1Constructors.scad>
use <../lib/TOGPath1.scad>
use <../lib/TOGUnits1.scad>

groove_depth_mm = togunits1_decode(groove_depth);
groove_width_mm = togunits1_decode(groove_width);

block_size_y = 38.1;
by0 = -block_size_y/2;
by1 =  block_size_y/2;

top_length = block_size_y/cos(angle);

foot_thickness_mm = 6.35;

function translation_matrix_2d(offset) = [
	[1, 0, offset[0]],
	[0, 1, offset[1]],
	[0, 0,         1],
];

function rotation_matrix_2d(angle) = [
	[cos(angle), -sin(angle), 0],
	[sin(angle),  cos(angle), 0],
	[         0,           0, 1],
];

topmtrx = translation_matrix_2d([by0,foot_thickness_mm]) * rotation_matrix_2d(angle) * translation_matrix_2d([top_length/2,0]);

function mmult2d(matrix, vec) =
	let(vec_extended = [vec[0], vec[1], 1])
	let(prod = matrix * vec_extended)
	[prod[0], prod[1]];

togmod1_domodule(
	togmod1_linear_extrude_x([-12.7, 12.7], togpath1_rath_to_polygon(["togpath1-rath",
		["togpath1-rathnode", [by0, foot_thickness_mm], ["round", 3]],
		["togpath1-rathnode", [by0, 0], ["bevel", 3.175], ["round", 3]],
		["togpath1-rathnode", [by1, 0], ["bevel", 3.175], ["round", 3]],
		["togpath1-rathnode", [by1, foot_thickness_mm + sin(angle)/cos(angle)*block_size_y], ["round", 3]],
		["togpath1-rathnode", mmult2d(topmtrx, [ groove_width_mm/2, 0]), ["round", 3]],
		["togpath1-rathnode", mmult2d(topmtrx, [ groove_width_mm/2, -groove_depth_mm])],
		["togpath1-rathnode", mmult2d(topmtrx, [-groove_width_mm/2, -groove_depth_mm])],
		["togpath1-rathnode", mmult2d(topmtrx, [-groove_width_mm/2, 0]), ["round", 3]],
	]))
);
